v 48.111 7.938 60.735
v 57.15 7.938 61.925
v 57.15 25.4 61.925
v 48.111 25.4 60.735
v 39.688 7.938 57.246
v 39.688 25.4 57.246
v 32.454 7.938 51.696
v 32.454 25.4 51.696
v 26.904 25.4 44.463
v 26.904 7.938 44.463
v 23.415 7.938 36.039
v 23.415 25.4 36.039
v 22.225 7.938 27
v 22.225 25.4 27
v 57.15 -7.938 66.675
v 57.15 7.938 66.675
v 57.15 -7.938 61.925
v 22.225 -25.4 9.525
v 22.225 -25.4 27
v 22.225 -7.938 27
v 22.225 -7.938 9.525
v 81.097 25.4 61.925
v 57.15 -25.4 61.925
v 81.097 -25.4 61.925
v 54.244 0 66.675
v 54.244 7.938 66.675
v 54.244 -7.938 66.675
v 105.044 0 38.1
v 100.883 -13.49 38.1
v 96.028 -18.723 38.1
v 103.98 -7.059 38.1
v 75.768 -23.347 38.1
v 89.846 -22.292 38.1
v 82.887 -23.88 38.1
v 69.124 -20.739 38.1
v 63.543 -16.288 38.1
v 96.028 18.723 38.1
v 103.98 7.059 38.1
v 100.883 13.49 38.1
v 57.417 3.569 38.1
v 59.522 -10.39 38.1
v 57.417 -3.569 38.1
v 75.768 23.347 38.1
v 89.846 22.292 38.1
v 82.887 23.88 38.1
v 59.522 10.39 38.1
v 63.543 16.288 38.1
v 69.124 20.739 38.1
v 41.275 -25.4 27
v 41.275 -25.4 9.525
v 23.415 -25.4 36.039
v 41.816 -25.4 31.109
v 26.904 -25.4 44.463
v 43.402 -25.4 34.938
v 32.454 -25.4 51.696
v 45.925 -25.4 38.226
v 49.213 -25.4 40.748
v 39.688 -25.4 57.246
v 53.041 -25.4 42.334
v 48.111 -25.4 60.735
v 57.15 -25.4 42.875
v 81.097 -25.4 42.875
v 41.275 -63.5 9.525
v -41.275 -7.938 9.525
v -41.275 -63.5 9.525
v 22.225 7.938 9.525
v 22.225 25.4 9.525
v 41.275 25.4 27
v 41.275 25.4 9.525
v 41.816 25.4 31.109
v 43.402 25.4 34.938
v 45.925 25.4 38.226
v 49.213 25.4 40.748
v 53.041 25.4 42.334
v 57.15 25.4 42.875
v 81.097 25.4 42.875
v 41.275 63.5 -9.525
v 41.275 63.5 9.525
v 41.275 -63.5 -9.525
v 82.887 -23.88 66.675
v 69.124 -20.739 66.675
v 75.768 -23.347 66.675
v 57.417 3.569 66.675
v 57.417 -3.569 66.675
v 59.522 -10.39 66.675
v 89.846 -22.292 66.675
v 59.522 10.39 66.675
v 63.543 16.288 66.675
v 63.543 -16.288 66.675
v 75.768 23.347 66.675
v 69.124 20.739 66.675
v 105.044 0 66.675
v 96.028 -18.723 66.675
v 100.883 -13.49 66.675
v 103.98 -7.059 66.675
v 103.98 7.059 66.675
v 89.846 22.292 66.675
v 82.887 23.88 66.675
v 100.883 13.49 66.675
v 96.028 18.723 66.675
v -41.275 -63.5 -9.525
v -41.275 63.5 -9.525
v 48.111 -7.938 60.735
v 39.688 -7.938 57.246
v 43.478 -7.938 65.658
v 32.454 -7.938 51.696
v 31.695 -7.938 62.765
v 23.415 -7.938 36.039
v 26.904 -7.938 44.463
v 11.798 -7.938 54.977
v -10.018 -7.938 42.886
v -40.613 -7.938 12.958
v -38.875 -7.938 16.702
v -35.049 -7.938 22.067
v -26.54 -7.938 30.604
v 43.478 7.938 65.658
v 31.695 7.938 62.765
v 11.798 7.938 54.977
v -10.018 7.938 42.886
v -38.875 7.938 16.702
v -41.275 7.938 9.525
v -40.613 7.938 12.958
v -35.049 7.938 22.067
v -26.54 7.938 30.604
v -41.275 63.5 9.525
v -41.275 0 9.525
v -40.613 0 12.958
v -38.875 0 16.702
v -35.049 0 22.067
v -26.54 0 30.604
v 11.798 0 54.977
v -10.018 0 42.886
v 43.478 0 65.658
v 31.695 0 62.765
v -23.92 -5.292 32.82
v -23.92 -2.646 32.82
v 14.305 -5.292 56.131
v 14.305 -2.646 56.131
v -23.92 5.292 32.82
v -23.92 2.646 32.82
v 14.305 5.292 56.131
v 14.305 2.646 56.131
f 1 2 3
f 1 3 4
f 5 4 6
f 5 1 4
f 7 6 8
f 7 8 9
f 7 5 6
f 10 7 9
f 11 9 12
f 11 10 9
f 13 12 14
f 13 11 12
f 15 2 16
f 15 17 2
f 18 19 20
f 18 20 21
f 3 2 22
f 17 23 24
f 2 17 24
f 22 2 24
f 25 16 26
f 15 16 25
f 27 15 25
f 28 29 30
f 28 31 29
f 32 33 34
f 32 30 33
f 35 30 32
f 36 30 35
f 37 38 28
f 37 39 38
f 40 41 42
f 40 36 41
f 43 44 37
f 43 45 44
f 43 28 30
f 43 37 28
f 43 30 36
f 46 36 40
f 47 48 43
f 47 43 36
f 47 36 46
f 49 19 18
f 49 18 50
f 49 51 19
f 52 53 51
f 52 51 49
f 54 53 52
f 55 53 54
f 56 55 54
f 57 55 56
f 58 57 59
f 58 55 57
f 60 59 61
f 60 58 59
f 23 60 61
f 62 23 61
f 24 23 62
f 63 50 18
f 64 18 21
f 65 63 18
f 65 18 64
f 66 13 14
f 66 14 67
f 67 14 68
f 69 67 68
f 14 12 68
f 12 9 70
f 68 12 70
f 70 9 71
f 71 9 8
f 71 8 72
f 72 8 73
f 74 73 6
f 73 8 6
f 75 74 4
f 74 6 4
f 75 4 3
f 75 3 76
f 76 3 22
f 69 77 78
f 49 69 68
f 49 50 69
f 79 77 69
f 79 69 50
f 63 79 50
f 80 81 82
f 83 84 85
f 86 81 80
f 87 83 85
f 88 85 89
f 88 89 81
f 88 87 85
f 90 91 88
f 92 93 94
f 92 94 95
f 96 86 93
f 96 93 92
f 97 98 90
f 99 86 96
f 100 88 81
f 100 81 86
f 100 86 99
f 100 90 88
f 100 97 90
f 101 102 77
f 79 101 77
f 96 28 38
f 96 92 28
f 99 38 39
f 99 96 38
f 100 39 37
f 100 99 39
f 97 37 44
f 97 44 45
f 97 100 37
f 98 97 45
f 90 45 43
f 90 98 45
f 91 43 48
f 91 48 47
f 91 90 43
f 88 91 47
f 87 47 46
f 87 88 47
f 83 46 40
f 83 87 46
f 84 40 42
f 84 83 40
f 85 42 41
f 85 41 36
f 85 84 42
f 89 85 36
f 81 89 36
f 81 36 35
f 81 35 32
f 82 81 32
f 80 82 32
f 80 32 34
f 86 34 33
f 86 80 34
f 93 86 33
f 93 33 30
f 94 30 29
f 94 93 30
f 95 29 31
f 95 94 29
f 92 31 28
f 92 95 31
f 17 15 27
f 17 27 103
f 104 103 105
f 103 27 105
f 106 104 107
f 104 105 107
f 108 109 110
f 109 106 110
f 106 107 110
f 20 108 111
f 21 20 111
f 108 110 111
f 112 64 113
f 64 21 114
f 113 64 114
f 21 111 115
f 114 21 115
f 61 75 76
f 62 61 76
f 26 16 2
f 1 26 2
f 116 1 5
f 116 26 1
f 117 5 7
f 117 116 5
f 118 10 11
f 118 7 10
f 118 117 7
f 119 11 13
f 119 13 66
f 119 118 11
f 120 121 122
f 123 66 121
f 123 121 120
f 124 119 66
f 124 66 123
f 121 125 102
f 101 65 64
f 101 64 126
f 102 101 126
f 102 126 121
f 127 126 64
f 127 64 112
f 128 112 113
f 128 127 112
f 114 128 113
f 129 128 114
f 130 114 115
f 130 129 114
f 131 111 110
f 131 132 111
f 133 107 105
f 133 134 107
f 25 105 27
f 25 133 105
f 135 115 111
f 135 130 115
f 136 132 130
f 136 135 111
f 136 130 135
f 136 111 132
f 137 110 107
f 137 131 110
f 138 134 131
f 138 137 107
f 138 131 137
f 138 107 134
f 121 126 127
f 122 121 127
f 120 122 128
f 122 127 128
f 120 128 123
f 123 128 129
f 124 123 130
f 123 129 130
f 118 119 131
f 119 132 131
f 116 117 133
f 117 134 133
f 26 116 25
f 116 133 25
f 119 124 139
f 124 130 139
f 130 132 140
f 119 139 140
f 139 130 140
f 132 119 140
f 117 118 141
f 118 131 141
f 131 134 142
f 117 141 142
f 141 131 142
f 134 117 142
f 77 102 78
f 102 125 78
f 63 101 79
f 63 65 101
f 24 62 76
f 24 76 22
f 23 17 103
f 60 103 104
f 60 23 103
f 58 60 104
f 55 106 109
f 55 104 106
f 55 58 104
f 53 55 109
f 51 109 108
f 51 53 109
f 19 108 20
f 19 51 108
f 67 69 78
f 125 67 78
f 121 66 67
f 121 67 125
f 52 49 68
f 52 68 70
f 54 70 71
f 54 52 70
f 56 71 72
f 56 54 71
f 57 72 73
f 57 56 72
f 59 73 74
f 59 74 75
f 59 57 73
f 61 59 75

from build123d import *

# Parameters (mm, degrees)
F1_DEPTH = 63.5
F0_W     = 23.947123
F0_H     = 19.05
F2_DEPTH = 25.4
F3_DEPTH = 7.9375


with BuildPart() as f1:
    # F0 (on Front) → F1 (new body, symmetric)
    with BuildSketch(Plane.XZ):
        Polygon((-41.275, -9.525), (41.275, -9.525), (41.275, 9.525), (22.225, 9.525), (-41.275, 9.525), align=None)
    extrude(amount=F1_DEPTH, both=True)

    # F0 (on Front) → F2 (join, symmetric)
    with BuildSketch(Plane.XZ):
        with BuildLine():
            Line((22.225, 9.525), (41.275, 9.525))
            Line((41.275, 9.525), (41.275, 27.0002))
            ThreePointArc((41.275, 27.0002), (45.92468, 38.22552), (57.15, 42.8752))
            Line((57.15, 42.8752), (57.15, 61.9252))
            ThreePointArc((57.15, 61.9252), (32.454296, 51.695904), (22.225, 27.0002))
            Line((22.225, 27.0002), (22.225, 9.525))
        make_face()
        with Locations((69.123561, 52.4002)):
            Rectangle(F0_W, F0_H)
    extrude(amount=F2_DEPTH, both=True)

    # F0 (on Front) → F3 (join, symmetric)
    with BuildSketch(Plane.XZ):
        with BuildLine():
            add(Edge.make_bspline(
                [(-41.275, 9.525), (-40.740337, 28.552236), (19.834127, 66.774502), (54.244246, 66.675)],
                knots=[0, 0, 0, 0, 111.310597, 111.310597, 111.310597, 111.310597], degree=3))
            Line((-41.275, 9.525), (22.225, 9.525))
            Line((22.225, 9.525), (22.225, 27.0002))
            ThreePointArc((22.225, 27.0002), (32.454296, 51.695904), (57.15, 61.9252))
            Line((57.15, 61.9252), (57.15, 66.675))
            Line((57.15, 66.675), (54.244246, 66.675))
        make_face()
    extrude(amount=F3_DEPTH, both=True)


with BuildPart() as f4:
    # F0 (on Front) → F4 (revolve)
    with BuildSketch(Plane.XZ):
        Polygon((81.097123, 61.9252), (81.097123, 42.8752), (81.097123, 38.1), (105.044246, 38.1), (105.044246, 66.675), (81.097123, 66.675), align=None)
    revolve(axis=Axis((81.097123, 0, 52.3875), (0, 0, 1)))


solid = Compound([f1.part, f4.part])
